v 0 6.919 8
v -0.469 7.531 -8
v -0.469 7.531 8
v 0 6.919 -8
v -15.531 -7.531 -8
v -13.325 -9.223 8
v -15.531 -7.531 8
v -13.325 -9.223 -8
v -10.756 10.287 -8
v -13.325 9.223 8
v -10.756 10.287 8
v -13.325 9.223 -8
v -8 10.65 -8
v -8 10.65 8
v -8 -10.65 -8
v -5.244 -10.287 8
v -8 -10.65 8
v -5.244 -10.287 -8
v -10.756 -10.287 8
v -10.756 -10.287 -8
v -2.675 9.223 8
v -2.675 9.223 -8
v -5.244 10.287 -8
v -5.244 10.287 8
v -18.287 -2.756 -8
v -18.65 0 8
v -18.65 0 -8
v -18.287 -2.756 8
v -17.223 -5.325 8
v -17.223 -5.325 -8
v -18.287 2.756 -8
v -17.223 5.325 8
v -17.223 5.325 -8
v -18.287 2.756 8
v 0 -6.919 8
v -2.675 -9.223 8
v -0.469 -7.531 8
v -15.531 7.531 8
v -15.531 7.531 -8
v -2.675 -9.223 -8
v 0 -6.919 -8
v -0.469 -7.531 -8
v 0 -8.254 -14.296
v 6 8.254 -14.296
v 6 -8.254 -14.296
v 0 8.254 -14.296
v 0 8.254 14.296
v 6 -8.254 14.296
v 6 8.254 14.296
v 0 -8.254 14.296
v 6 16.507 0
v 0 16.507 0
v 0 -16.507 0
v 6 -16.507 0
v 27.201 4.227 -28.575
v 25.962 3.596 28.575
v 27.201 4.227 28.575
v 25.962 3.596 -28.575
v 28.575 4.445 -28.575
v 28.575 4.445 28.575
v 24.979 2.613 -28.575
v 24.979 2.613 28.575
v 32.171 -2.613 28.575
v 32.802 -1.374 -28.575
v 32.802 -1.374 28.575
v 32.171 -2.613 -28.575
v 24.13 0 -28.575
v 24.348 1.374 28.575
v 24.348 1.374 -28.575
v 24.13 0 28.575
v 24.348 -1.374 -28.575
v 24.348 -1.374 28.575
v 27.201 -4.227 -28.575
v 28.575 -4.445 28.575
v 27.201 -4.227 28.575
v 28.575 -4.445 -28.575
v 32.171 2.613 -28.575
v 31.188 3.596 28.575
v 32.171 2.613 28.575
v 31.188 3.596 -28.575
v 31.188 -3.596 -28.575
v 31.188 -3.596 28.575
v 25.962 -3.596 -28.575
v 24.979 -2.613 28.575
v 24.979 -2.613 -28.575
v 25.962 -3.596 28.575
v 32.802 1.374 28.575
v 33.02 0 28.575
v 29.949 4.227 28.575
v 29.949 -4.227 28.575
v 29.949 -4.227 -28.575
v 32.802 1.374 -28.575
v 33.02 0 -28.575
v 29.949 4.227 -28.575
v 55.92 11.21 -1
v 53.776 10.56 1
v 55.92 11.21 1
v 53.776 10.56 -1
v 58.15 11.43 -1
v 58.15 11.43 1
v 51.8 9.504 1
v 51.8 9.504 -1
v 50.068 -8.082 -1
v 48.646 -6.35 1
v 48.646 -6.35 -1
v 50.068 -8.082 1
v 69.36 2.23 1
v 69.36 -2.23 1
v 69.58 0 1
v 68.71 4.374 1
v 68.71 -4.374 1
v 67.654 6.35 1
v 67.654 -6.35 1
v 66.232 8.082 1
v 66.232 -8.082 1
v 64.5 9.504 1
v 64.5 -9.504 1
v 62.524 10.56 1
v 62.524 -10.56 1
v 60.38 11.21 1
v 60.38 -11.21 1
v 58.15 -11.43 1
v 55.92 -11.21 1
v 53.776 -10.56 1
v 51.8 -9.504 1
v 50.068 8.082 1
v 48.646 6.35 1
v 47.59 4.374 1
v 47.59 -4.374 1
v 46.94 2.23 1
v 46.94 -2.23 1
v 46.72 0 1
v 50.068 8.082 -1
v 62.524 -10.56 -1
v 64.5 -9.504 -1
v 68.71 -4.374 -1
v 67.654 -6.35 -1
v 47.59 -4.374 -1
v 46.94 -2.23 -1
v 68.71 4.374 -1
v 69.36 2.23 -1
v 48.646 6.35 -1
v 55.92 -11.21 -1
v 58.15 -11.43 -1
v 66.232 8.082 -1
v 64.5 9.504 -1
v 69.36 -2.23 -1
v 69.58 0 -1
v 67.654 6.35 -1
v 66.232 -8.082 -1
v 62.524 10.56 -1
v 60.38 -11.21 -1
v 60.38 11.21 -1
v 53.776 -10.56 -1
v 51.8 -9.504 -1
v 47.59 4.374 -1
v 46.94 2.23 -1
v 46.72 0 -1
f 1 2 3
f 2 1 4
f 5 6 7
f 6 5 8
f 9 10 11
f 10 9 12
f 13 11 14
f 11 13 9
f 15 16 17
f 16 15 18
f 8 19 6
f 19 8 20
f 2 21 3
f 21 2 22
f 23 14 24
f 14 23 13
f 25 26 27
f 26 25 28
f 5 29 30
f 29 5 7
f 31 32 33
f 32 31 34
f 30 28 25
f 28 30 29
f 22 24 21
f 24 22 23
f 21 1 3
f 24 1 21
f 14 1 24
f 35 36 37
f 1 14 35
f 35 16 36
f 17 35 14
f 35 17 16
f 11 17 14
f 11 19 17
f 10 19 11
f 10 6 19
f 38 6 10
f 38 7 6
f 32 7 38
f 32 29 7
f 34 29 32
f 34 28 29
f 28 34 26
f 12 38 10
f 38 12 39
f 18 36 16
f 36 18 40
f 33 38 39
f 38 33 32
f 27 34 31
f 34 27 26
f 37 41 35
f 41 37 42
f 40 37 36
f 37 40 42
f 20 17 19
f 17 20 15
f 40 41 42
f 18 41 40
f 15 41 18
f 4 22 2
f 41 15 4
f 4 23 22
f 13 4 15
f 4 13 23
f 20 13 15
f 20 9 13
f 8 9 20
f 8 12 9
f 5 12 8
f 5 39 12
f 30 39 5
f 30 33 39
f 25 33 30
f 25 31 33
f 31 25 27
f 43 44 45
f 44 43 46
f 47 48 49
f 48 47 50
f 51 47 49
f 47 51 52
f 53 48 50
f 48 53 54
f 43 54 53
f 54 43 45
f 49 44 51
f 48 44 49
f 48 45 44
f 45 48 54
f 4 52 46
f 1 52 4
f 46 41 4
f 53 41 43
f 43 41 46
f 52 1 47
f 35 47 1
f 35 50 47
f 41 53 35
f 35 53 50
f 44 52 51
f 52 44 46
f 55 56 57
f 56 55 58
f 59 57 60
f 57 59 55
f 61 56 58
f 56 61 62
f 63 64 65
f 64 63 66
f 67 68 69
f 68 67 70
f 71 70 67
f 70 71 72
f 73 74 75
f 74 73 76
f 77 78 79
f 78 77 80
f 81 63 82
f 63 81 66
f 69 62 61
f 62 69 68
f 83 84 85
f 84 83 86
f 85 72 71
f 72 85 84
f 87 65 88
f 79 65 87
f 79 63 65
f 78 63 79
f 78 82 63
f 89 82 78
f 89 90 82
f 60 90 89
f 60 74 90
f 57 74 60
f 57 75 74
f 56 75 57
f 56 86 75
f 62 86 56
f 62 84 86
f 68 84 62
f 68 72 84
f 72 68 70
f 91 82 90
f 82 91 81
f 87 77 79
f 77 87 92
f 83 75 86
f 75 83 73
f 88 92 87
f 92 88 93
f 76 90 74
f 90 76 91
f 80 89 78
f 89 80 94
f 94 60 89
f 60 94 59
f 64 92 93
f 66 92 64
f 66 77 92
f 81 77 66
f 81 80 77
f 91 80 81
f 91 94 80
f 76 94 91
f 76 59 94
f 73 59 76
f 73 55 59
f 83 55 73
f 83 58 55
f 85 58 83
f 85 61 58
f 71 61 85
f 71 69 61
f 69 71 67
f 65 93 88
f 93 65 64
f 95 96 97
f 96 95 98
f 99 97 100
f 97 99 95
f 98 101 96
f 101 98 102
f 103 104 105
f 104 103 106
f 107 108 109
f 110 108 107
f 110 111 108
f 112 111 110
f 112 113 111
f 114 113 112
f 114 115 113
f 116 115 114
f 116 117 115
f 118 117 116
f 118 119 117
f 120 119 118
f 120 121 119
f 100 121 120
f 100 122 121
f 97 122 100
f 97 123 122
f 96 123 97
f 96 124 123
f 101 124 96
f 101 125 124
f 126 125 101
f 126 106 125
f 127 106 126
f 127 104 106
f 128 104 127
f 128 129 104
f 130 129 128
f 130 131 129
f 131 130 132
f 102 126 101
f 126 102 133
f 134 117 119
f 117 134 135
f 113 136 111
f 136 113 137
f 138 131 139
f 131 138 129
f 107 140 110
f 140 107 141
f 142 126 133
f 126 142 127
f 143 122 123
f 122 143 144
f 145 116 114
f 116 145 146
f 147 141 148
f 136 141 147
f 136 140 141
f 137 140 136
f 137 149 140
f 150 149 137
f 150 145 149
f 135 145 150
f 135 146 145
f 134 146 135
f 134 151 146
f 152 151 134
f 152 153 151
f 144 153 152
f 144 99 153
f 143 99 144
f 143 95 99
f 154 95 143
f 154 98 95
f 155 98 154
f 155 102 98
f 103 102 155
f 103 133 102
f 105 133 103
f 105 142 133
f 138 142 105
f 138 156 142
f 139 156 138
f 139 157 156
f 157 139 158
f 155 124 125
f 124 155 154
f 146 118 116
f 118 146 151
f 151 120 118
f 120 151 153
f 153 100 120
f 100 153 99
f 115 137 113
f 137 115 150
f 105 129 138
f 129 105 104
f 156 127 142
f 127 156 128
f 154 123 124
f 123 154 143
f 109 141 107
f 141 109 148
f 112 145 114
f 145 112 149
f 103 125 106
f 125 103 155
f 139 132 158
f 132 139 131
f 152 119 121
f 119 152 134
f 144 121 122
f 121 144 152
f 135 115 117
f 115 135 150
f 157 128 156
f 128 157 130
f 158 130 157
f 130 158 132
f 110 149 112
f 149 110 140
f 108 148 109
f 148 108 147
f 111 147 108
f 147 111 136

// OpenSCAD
// Auto-generated by scripts/author_from_manifest.py (Phase D.3).
// Source: data/phase_d_manifest.json (sku_intent='viking-vk630-sidewall-175f').
// Do not hand-edit — regenerate from the manifest.
//
// @part viking_vk630_sidewall_175f
// @kind sprinkler_head
// @category head.sidewall.k56
// @display-name "Viking VK630 Horizontal Sidewall K5.6 QR 175°F"
// @mfg viking_group
// @mfg-pn VK630
// @listing UL FM
// @hazard-classes LH OH1
// @price-usd 15.25
// @install-minutes 8
// @crew journeyman
// @k-factor 5.6
// @orientation sidewall
// @response quick
// @temperature 175F
// @param size_in number default=0.5 label="Size" unit="in"
// @port inlet position=[0,0.014,0] direction=[0,1,0] style=NPT_threaded size_in=0.5 role=drop

size_in = 0.5;
k_factor = 5.6;

length_mm   = 57.15;
body_dia_mm = 25.40;
thread_od   = 21.3;
thread_len  = 16;
deflector_d = body_dia_mm * 0.9;

rotate([0,0,90]) union() {
    translate([0, thread_len/2, 0])
        cylinder(h = thread_len, d = thread_od, center = true, $fn = 24);
    translate([0, -3, 0])
        rotate([90, 0, 0])
        cylinder(h = 6, d = thread_od * 1.55, $fn = 6, center = true);
    translate([0, -length_mm/2, 0])
        cylinder(h = length_mm, d = body_dia_mm * 0.35, center = true, $fn = 20);
    translate([0, -length_mm - 1, 0])
        cylinder(h = 2, d = deflector_d, center = true, $fn = 32);
}
